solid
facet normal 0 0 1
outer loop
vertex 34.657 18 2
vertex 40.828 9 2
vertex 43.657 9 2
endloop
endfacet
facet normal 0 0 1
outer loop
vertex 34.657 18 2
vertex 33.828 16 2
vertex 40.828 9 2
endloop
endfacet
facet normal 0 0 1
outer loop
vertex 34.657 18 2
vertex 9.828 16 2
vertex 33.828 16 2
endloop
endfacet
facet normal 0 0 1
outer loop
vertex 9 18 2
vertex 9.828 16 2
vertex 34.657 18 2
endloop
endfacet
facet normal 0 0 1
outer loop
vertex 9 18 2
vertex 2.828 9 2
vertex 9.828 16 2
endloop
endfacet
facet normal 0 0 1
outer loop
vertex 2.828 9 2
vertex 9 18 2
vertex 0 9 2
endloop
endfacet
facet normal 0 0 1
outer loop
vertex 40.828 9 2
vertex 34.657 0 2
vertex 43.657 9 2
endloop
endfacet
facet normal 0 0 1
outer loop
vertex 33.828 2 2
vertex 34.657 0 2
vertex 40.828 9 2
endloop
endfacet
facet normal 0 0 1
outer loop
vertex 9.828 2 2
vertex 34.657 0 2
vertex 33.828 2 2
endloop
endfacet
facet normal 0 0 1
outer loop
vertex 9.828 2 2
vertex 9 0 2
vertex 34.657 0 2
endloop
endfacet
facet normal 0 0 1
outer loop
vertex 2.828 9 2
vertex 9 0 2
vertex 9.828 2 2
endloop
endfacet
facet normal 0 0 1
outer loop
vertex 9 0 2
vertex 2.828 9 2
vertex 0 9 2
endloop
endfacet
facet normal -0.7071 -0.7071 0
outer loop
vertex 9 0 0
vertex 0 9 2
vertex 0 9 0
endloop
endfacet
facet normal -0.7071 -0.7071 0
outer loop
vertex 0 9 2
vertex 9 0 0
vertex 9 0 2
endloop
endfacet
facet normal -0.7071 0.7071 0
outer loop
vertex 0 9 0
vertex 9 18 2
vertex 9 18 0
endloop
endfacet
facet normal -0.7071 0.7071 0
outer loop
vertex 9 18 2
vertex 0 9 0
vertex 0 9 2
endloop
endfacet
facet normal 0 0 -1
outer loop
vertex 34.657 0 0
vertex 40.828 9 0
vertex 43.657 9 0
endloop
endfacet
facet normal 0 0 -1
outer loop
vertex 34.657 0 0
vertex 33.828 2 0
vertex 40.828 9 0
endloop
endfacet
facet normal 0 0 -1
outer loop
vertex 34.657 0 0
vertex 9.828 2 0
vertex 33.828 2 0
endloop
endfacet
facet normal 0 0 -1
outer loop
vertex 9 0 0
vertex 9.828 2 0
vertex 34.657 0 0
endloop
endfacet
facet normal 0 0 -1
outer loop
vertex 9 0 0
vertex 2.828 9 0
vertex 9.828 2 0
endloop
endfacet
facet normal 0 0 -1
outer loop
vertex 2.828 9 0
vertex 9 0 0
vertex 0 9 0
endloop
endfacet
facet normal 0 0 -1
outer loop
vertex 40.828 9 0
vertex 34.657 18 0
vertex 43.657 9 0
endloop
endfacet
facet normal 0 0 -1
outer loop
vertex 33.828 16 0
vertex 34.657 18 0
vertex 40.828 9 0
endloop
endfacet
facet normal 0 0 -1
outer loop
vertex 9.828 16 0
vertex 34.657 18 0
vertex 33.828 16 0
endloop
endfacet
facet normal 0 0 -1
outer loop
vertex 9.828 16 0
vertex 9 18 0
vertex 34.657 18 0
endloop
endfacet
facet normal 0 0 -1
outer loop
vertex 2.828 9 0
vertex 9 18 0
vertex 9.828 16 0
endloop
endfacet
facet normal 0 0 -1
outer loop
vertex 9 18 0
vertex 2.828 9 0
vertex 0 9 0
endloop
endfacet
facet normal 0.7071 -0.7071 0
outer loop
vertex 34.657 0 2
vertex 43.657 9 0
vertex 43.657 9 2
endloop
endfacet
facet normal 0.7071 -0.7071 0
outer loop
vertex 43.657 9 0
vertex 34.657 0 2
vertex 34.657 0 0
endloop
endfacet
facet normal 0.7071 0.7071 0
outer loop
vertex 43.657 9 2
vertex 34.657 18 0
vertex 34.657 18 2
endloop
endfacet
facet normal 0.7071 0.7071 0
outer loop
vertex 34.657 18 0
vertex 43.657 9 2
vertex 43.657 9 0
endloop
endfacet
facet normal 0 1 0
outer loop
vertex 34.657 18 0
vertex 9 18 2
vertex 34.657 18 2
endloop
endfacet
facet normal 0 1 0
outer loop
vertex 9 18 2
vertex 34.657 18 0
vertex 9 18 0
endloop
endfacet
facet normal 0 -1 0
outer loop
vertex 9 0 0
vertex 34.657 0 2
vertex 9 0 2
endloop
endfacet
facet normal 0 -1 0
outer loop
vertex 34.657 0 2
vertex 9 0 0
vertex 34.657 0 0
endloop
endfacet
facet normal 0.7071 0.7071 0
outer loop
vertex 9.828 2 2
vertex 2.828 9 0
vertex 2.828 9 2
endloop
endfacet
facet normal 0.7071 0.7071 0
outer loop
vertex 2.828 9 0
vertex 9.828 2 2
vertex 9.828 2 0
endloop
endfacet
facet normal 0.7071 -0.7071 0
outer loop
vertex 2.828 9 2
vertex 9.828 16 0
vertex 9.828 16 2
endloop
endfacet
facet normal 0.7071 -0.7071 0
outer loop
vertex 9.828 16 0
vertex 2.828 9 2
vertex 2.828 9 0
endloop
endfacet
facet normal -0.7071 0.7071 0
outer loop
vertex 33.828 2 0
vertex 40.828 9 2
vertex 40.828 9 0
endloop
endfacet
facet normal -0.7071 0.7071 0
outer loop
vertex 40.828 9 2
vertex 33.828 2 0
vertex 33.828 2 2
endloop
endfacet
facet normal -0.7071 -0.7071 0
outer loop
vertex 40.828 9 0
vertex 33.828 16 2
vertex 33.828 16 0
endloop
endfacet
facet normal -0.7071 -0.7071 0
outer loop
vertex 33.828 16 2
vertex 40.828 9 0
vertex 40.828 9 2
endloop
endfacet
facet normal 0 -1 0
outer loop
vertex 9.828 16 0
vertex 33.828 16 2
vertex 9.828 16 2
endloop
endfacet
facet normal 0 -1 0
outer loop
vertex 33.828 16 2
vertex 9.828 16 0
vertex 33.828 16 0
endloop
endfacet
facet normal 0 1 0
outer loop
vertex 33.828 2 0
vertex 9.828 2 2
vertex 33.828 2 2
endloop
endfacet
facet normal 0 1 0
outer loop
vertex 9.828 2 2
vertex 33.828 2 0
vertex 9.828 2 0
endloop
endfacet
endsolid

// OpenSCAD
module figure(len_x, len_y, len_z) {
  union() {
    square_x = len_y / sqrt(2);
    square_z = len_z;

    translate([len_y / 2, 0, 0])
    rotate(a = 45, v = [0, 0, 1])
    cube([square_x, square_x, len_z]);

    translate([len_x - len_y / 2, 0, 0])
    rotate(a = 45, v = [0, 0, 1])
    cube([square_x, square_x, len_z]);

    translate([len_y / 2, 0, 0])
    cube([len_x - len_y, len_y, len_z]);
  }
}

module plug_hole(border_thickness = 2, depth = 2, thin = true) {
  hole_x_mm = 38;
  hole_y_mm = 14;
  hole_angle_deg = 45;

  border_x_mm = border_thickness * sqrt(2);
  border_y_mm = border_thickness;

  difference() {
    if (thin) {
      figure(hole_x_mm + 2 * border_x_mm, hole_y_mm + 2 * border_y_mm, depth);
    } else {
      cube([hole_x_mm + 2 * border_x_mm, hole_y_mm + 2 * border_y_mm, depth]);
    }


    translate([border_x_mm, border_y_mm, 0])
    figure(hole_x_mm, hole_y_mm, depth);
  }
}

plug_hole(border_thickness = 2, depth = 2, thin = true);
